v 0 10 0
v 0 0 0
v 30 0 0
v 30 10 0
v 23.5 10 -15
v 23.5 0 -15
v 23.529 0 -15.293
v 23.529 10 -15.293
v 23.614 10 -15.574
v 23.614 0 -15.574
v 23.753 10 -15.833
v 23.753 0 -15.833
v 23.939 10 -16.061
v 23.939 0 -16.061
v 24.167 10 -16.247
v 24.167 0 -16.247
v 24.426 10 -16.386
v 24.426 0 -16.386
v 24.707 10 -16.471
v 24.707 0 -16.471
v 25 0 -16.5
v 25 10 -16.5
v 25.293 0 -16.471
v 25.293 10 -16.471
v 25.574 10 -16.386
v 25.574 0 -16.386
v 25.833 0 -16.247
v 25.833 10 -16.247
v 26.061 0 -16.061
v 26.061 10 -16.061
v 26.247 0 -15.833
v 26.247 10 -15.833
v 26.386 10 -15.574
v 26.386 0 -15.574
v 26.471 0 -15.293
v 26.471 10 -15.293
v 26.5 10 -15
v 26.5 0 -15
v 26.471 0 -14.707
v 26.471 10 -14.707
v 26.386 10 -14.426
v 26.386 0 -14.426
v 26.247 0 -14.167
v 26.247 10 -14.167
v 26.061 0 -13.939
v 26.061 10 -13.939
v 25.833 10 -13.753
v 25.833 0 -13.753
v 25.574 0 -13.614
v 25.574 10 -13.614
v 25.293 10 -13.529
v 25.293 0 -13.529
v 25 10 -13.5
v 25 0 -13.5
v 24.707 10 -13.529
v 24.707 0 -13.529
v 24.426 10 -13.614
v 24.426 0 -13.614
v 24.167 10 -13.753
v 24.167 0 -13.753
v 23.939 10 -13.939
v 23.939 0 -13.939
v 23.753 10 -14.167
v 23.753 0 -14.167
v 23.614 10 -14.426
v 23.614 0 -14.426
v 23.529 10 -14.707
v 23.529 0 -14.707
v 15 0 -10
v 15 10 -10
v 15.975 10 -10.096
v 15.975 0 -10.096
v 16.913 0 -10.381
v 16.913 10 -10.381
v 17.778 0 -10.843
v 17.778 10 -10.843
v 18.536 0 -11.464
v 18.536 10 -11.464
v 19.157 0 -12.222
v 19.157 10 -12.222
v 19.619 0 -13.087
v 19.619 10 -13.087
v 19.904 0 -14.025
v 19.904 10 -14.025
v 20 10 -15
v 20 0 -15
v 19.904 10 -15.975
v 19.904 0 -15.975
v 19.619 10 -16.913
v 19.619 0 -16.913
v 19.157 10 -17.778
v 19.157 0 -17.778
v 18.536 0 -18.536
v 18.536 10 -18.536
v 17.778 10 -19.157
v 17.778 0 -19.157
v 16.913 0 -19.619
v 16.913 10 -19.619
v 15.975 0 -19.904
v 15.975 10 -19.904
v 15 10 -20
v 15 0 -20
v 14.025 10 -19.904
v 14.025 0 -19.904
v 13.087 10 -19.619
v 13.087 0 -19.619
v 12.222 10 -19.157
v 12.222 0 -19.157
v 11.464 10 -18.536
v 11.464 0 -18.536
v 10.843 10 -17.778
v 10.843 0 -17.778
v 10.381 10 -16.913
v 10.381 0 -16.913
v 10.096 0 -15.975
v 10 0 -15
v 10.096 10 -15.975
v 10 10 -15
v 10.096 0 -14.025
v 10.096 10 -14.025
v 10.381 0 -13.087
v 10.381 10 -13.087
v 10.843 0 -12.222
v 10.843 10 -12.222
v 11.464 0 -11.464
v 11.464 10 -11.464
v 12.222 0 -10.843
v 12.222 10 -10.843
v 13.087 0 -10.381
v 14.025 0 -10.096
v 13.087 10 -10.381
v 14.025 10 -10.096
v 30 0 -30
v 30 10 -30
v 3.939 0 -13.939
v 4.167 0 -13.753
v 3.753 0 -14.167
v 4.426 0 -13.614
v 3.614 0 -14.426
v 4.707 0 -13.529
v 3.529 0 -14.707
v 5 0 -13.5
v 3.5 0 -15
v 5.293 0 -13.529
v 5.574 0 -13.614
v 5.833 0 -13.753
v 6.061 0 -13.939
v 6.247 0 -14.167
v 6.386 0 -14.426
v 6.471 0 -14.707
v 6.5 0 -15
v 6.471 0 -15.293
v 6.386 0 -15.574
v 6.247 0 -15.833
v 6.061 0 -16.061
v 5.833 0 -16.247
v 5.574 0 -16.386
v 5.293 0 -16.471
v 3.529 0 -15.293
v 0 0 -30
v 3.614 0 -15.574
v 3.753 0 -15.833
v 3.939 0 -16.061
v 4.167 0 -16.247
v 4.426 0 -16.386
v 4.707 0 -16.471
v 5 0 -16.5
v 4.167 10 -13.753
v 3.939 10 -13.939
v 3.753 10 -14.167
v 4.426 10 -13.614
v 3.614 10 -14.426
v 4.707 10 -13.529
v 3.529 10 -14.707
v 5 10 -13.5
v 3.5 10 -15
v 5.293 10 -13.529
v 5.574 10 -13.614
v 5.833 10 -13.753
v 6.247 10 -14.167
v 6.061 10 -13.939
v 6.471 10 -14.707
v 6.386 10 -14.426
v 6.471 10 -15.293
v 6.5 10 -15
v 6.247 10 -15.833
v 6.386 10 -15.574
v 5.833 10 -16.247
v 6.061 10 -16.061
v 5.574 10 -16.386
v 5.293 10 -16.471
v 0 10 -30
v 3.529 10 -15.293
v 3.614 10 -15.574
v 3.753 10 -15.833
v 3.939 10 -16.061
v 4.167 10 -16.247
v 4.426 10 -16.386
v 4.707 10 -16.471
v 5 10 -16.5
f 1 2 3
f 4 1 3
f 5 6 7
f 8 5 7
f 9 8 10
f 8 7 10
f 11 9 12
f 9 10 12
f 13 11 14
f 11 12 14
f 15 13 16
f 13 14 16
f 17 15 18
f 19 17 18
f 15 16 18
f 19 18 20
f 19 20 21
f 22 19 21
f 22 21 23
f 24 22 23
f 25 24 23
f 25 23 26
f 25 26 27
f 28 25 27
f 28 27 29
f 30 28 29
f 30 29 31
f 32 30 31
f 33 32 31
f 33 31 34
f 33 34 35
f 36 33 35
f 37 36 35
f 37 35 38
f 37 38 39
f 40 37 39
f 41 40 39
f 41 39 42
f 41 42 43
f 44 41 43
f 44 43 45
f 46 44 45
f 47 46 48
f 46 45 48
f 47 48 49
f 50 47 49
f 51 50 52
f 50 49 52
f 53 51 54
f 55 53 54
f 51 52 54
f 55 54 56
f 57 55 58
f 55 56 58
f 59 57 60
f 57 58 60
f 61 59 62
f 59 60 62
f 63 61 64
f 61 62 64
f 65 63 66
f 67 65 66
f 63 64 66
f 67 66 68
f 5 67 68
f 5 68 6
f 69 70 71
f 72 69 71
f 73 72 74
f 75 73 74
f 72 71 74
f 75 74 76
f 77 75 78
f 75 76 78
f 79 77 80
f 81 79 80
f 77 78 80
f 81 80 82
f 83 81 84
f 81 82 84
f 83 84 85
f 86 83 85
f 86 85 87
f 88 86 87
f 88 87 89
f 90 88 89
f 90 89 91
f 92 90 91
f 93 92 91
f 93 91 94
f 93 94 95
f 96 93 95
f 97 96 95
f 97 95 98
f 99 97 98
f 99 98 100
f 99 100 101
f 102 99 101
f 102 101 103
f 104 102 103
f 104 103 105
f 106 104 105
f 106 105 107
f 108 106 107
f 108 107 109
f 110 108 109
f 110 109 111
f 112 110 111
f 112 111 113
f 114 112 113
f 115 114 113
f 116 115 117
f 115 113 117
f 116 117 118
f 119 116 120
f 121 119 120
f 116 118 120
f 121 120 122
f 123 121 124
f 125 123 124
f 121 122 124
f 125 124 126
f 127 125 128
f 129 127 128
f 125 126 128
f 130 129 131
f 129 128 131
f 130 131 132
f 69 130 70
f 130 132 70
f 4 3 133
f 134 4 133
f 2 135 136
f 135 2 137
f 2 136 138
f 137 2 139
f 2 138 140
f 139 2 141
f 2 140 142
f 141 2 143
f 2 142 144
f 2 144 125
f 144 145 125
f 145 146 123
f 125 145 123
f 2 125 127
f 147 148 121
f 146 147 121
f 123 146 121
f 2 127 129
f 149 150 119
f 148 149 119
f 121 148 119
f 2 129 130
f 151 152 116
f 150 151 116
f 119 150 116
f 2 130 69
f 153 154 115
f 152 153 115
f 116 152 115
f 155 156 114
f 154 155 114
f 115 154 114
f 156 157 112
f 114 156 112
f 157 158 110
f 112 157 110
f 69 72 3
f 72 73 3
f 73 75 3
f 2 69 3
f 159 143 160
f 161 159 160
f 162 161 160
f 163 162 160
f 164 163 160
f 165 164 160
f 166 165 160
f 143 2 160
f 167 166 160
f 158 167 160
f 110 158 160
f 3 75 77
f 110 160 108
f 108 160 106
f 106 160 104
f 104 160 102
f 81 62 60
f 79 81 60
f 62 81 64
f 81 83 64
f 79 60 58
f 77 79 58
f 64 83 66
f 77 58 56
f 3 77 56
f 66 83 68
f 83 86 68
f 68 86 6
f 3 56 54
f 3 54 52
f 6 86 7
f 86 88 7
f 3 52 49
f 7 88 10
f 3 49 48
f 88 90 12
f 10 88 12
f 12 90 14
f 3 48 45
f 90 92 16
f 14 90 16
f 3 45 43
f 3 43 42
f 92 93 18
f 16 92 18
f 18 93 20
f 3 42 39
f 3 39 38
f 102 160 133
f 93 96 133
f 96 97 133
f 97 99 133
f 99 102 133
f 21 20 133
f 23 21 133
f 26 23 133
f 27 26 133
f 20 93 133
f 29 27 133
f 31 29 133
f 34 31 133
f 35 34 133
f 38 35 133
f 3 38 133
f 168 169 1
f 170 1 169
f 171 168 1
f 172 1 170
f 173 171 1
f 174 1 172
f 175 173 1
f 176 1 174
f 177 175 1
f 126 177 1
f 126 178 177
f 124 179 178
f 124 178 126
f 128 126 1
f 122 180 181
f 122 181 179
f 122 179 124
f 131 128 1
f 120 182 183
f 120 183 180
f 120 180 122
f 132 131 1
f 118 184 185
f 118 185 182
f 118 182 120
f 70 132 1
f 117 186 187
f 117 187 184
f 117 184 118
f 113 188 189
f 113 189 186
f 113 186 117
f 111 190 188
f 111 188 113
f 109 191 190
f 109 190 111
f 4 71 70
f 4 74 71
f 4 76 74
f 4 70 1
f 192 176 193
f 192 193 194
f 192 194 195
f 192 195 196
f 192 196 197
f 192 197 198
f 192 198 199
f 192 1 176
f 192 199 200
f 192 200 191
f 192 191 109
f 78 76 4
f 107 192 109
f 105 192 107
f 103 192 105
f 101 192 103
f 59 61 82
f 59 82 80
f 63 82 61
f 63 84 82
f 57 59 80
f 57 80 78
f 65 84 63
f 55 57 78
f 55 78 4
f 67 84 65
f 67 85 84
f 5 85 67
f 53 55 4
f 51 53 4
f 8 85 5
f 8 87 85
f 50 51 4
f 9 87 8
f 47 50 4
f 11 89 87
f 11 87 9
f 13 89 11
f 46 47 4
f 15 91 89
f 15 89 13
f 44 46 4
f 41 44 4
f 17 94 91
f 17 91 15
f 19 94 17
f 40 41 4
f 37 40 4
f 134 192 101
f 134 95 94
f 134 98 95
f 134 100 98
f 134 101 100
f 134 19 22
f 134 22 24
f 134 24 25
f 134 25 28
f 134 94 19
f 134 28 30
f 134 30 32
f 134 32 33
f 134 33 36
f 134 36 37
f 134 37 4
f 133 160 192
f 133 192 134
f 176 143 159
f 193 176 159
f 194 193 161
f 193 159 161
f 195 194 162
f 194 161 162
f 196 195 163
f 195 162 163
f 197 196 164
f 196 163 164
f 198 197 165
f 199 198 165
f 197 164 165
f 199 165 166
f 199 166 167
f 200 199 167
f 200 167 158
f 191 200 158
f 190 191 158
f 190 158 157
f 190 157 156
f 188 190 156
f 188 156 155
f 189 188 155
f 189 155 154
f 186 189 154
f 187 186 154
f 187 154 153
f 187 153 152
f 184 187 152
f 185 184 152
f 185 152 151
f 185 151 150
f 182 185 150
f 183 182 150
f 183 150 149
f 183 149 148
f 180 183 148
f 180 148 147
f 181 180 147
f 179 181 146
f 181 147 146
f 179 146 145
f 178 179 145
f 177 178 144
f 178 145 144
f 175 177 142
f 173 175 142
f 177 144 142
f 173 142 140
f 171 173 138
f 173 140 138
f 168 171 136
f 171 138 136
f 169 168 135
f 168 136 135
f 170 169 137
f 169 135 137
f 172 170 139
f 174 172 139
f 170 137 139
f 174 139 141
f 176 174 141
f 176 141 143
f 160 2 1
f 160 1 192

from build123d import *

# Parameters (mm, degrees)
SKETCH1_W             = 30
SKETCH1_H             = 30
BOSS_EXTRUDE1_DEPTH   = 10
SKETCH2_R             = 5
CUT_EXTRUDE1_DEPTH    = 44.588989435
F_3_0MM_DOWEL_HOLE1_D = 3


with BuildPart() as part:
    # Sketch1 → Boss-Extrude1 (new body)
    with BuildSketch(Plane(origin=(0, 0, 0), x_dir=(1, 0, 0), z_dir=(0, 1, 0))):
        with Locations((15, 15)):
            Rectangle(SKETCH1_W, SKETCH1_H)
    extrude(amount=BOSS_EXTRUDE1_DEPTH)

    # Sketch2 → Cut-Extrude1 (cut, through all)
    with BuildSketch(Plane(origin=(0, 10, 0), x_dir=(1, 0, 0), z_dir=(0, 1, 0))):
        with Locations(Location((15, 15, 0), (0, 0, 270))):
            Circle(SKETCH2_R)
    extrude(amount=-CUT_EXTRUDE1_DEPTH, mode=Mode.SUBTRACT)

    # Ø3.0mm Dowel Hole1 (through all)
    with Locations(Plane(origin=(0, 10, 0), x_dir=(1, 0, 0), z_dir=(0, 1, 0))):
        with Locations((5, 15), (25, 15)):
            Hole(F_3_0MM_DOWEL_HOLE1_D / 2)


solid = part.part
